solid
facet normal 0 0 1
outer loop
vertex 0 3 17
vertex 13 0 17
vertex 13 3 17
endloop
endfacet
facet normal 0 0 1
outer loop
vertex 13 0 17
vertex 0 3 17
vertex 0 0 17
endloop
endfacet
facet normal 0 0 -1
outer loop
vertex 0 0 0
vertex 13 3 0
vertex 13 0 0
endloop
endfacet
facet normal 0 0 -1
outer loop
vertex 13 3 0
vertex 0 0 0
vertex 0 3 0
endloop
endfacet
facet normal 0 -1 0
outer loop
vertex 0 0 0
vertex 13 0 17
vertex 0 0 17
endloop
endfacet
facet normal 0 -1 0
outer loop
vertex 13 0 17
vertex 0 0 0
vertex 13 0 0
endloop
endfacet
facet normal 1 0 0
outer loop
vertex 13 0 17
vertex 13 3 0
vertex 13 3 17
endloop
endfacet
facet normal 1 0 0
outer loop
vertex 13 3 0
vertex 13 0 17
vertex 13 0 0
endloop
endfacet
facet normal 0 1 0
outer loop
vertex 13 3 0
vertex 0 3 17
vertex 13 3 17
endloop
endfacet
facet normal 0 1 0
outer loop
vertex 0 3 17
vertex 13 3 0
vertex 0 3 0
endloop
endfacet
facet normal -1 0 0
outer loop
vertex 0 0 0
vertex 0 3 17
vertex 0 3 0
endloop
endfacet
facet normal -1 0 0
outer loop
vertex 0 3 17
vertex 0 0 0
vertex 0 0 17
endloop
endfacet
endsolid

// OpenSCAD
// Generated by SolidPython 1.0.1 on 2020-07-29 00:46:55


cube(size = [13, 3, 17]);
/***********************************************
*********      SolidPython code:      **********
************************************************
 
# import packages: SolidPython
from solid import *
from solid.utils import *
from itertools import chain, combinations, permutations


class Resize:

    def __init__(self, scad_file):
        self.scad_file = scad_file
        #self.scad_file = import_scad(scad_file)
        # cone/cylinder param:
        self.r1 = 0
        self.r2 = 0
        self.h = 0
        # rectangular prism param:
        self.w = 0
        self.l = 0
        # ellipse param:
        self.r = 0

    # import OpenScad code (file name corresponds to shape)


    # classify shape + parameters
    def assign(self, param1, param2, param3):
        if self.scad_file == 'cone.scad':
            self.r1 = param1
            self.r2 = param2
            self.h = param3
        elif self.scad_file == 'cylinder.scad':
            self.r1 = param1
            self.r2 = param2
            self.h = param3
        elif self.scad_file == 'rectangularPrism.scad':
            self.h = param1
            self.l = param2
            self.w = param3
        else:
            self.r = param1
            self.h = param2

    # resize parameters
    def iterate(self):
        x = range(3, 20, 2)
        i = 1
        if self.scad_file == 'cone.scad':
            tempList = list(permutations(x, 2))
            for temp in tempList:
                param1 = temp[0]
                param2 = temp[1]
                filepath = 'produced_scad_files/' + 'cone' + str(param1) + '_' + str(param2) + '_' + '.scad'
                scad_render_to_file(cylinder(h=param1, r1=param2, r2=0), filepath)

        elif self.scad_file == 'cylinder.scad':
            tempList = list(permutations(x, 3))
            for temp in tempList:
                param1 = temp[0]
                param2 = temp[1]
                filepath = 'produced_scad_files/' + 'cylinder' + str(param1) + '_' + str(param2) + '_' + '.scad'
                scad_render_to_file(cylinder(h=param1, r1=param2, r2=param2), filepath)

        elif self.scad_file == 'rectangularPrism.scad':
            tempList = list(permutations(x, 3))
            for temp in tempList:
                param1 = temp[0]
                param2 = temp[1]
                param3 = temp[2]
                filepath = 'produced_scad_files/' + 'rectangularPrism' + str(param1) + '_' + str(param2) + '_' + str(
                    param3) + '.scad'
                scad_render_to_file(cube(size=(param1, param2, param3)), filepath)

        elif self.scad_file == 'ellipse.scad':
            tempList = list(permutations(x, 4))
            for temp in tempList:
                param1 = temp[0]
                param2 = temp[1]
                param3 = temp[2]
                param4 = temp[3]
                filepath = 'produced_scad_files/' + 'ellipse' + str(param1) + '_' + str(param2) + '_' + str(param3) + '_' + str(param4) + '.scad'
                scad_render_to_file(scale([param1, param2, param3])(sphere(r=param4)), filepath)

    def render_to_scadfile(self):
        scad_render_to_file(scad, 'example.scad') 
 
************************************************/
